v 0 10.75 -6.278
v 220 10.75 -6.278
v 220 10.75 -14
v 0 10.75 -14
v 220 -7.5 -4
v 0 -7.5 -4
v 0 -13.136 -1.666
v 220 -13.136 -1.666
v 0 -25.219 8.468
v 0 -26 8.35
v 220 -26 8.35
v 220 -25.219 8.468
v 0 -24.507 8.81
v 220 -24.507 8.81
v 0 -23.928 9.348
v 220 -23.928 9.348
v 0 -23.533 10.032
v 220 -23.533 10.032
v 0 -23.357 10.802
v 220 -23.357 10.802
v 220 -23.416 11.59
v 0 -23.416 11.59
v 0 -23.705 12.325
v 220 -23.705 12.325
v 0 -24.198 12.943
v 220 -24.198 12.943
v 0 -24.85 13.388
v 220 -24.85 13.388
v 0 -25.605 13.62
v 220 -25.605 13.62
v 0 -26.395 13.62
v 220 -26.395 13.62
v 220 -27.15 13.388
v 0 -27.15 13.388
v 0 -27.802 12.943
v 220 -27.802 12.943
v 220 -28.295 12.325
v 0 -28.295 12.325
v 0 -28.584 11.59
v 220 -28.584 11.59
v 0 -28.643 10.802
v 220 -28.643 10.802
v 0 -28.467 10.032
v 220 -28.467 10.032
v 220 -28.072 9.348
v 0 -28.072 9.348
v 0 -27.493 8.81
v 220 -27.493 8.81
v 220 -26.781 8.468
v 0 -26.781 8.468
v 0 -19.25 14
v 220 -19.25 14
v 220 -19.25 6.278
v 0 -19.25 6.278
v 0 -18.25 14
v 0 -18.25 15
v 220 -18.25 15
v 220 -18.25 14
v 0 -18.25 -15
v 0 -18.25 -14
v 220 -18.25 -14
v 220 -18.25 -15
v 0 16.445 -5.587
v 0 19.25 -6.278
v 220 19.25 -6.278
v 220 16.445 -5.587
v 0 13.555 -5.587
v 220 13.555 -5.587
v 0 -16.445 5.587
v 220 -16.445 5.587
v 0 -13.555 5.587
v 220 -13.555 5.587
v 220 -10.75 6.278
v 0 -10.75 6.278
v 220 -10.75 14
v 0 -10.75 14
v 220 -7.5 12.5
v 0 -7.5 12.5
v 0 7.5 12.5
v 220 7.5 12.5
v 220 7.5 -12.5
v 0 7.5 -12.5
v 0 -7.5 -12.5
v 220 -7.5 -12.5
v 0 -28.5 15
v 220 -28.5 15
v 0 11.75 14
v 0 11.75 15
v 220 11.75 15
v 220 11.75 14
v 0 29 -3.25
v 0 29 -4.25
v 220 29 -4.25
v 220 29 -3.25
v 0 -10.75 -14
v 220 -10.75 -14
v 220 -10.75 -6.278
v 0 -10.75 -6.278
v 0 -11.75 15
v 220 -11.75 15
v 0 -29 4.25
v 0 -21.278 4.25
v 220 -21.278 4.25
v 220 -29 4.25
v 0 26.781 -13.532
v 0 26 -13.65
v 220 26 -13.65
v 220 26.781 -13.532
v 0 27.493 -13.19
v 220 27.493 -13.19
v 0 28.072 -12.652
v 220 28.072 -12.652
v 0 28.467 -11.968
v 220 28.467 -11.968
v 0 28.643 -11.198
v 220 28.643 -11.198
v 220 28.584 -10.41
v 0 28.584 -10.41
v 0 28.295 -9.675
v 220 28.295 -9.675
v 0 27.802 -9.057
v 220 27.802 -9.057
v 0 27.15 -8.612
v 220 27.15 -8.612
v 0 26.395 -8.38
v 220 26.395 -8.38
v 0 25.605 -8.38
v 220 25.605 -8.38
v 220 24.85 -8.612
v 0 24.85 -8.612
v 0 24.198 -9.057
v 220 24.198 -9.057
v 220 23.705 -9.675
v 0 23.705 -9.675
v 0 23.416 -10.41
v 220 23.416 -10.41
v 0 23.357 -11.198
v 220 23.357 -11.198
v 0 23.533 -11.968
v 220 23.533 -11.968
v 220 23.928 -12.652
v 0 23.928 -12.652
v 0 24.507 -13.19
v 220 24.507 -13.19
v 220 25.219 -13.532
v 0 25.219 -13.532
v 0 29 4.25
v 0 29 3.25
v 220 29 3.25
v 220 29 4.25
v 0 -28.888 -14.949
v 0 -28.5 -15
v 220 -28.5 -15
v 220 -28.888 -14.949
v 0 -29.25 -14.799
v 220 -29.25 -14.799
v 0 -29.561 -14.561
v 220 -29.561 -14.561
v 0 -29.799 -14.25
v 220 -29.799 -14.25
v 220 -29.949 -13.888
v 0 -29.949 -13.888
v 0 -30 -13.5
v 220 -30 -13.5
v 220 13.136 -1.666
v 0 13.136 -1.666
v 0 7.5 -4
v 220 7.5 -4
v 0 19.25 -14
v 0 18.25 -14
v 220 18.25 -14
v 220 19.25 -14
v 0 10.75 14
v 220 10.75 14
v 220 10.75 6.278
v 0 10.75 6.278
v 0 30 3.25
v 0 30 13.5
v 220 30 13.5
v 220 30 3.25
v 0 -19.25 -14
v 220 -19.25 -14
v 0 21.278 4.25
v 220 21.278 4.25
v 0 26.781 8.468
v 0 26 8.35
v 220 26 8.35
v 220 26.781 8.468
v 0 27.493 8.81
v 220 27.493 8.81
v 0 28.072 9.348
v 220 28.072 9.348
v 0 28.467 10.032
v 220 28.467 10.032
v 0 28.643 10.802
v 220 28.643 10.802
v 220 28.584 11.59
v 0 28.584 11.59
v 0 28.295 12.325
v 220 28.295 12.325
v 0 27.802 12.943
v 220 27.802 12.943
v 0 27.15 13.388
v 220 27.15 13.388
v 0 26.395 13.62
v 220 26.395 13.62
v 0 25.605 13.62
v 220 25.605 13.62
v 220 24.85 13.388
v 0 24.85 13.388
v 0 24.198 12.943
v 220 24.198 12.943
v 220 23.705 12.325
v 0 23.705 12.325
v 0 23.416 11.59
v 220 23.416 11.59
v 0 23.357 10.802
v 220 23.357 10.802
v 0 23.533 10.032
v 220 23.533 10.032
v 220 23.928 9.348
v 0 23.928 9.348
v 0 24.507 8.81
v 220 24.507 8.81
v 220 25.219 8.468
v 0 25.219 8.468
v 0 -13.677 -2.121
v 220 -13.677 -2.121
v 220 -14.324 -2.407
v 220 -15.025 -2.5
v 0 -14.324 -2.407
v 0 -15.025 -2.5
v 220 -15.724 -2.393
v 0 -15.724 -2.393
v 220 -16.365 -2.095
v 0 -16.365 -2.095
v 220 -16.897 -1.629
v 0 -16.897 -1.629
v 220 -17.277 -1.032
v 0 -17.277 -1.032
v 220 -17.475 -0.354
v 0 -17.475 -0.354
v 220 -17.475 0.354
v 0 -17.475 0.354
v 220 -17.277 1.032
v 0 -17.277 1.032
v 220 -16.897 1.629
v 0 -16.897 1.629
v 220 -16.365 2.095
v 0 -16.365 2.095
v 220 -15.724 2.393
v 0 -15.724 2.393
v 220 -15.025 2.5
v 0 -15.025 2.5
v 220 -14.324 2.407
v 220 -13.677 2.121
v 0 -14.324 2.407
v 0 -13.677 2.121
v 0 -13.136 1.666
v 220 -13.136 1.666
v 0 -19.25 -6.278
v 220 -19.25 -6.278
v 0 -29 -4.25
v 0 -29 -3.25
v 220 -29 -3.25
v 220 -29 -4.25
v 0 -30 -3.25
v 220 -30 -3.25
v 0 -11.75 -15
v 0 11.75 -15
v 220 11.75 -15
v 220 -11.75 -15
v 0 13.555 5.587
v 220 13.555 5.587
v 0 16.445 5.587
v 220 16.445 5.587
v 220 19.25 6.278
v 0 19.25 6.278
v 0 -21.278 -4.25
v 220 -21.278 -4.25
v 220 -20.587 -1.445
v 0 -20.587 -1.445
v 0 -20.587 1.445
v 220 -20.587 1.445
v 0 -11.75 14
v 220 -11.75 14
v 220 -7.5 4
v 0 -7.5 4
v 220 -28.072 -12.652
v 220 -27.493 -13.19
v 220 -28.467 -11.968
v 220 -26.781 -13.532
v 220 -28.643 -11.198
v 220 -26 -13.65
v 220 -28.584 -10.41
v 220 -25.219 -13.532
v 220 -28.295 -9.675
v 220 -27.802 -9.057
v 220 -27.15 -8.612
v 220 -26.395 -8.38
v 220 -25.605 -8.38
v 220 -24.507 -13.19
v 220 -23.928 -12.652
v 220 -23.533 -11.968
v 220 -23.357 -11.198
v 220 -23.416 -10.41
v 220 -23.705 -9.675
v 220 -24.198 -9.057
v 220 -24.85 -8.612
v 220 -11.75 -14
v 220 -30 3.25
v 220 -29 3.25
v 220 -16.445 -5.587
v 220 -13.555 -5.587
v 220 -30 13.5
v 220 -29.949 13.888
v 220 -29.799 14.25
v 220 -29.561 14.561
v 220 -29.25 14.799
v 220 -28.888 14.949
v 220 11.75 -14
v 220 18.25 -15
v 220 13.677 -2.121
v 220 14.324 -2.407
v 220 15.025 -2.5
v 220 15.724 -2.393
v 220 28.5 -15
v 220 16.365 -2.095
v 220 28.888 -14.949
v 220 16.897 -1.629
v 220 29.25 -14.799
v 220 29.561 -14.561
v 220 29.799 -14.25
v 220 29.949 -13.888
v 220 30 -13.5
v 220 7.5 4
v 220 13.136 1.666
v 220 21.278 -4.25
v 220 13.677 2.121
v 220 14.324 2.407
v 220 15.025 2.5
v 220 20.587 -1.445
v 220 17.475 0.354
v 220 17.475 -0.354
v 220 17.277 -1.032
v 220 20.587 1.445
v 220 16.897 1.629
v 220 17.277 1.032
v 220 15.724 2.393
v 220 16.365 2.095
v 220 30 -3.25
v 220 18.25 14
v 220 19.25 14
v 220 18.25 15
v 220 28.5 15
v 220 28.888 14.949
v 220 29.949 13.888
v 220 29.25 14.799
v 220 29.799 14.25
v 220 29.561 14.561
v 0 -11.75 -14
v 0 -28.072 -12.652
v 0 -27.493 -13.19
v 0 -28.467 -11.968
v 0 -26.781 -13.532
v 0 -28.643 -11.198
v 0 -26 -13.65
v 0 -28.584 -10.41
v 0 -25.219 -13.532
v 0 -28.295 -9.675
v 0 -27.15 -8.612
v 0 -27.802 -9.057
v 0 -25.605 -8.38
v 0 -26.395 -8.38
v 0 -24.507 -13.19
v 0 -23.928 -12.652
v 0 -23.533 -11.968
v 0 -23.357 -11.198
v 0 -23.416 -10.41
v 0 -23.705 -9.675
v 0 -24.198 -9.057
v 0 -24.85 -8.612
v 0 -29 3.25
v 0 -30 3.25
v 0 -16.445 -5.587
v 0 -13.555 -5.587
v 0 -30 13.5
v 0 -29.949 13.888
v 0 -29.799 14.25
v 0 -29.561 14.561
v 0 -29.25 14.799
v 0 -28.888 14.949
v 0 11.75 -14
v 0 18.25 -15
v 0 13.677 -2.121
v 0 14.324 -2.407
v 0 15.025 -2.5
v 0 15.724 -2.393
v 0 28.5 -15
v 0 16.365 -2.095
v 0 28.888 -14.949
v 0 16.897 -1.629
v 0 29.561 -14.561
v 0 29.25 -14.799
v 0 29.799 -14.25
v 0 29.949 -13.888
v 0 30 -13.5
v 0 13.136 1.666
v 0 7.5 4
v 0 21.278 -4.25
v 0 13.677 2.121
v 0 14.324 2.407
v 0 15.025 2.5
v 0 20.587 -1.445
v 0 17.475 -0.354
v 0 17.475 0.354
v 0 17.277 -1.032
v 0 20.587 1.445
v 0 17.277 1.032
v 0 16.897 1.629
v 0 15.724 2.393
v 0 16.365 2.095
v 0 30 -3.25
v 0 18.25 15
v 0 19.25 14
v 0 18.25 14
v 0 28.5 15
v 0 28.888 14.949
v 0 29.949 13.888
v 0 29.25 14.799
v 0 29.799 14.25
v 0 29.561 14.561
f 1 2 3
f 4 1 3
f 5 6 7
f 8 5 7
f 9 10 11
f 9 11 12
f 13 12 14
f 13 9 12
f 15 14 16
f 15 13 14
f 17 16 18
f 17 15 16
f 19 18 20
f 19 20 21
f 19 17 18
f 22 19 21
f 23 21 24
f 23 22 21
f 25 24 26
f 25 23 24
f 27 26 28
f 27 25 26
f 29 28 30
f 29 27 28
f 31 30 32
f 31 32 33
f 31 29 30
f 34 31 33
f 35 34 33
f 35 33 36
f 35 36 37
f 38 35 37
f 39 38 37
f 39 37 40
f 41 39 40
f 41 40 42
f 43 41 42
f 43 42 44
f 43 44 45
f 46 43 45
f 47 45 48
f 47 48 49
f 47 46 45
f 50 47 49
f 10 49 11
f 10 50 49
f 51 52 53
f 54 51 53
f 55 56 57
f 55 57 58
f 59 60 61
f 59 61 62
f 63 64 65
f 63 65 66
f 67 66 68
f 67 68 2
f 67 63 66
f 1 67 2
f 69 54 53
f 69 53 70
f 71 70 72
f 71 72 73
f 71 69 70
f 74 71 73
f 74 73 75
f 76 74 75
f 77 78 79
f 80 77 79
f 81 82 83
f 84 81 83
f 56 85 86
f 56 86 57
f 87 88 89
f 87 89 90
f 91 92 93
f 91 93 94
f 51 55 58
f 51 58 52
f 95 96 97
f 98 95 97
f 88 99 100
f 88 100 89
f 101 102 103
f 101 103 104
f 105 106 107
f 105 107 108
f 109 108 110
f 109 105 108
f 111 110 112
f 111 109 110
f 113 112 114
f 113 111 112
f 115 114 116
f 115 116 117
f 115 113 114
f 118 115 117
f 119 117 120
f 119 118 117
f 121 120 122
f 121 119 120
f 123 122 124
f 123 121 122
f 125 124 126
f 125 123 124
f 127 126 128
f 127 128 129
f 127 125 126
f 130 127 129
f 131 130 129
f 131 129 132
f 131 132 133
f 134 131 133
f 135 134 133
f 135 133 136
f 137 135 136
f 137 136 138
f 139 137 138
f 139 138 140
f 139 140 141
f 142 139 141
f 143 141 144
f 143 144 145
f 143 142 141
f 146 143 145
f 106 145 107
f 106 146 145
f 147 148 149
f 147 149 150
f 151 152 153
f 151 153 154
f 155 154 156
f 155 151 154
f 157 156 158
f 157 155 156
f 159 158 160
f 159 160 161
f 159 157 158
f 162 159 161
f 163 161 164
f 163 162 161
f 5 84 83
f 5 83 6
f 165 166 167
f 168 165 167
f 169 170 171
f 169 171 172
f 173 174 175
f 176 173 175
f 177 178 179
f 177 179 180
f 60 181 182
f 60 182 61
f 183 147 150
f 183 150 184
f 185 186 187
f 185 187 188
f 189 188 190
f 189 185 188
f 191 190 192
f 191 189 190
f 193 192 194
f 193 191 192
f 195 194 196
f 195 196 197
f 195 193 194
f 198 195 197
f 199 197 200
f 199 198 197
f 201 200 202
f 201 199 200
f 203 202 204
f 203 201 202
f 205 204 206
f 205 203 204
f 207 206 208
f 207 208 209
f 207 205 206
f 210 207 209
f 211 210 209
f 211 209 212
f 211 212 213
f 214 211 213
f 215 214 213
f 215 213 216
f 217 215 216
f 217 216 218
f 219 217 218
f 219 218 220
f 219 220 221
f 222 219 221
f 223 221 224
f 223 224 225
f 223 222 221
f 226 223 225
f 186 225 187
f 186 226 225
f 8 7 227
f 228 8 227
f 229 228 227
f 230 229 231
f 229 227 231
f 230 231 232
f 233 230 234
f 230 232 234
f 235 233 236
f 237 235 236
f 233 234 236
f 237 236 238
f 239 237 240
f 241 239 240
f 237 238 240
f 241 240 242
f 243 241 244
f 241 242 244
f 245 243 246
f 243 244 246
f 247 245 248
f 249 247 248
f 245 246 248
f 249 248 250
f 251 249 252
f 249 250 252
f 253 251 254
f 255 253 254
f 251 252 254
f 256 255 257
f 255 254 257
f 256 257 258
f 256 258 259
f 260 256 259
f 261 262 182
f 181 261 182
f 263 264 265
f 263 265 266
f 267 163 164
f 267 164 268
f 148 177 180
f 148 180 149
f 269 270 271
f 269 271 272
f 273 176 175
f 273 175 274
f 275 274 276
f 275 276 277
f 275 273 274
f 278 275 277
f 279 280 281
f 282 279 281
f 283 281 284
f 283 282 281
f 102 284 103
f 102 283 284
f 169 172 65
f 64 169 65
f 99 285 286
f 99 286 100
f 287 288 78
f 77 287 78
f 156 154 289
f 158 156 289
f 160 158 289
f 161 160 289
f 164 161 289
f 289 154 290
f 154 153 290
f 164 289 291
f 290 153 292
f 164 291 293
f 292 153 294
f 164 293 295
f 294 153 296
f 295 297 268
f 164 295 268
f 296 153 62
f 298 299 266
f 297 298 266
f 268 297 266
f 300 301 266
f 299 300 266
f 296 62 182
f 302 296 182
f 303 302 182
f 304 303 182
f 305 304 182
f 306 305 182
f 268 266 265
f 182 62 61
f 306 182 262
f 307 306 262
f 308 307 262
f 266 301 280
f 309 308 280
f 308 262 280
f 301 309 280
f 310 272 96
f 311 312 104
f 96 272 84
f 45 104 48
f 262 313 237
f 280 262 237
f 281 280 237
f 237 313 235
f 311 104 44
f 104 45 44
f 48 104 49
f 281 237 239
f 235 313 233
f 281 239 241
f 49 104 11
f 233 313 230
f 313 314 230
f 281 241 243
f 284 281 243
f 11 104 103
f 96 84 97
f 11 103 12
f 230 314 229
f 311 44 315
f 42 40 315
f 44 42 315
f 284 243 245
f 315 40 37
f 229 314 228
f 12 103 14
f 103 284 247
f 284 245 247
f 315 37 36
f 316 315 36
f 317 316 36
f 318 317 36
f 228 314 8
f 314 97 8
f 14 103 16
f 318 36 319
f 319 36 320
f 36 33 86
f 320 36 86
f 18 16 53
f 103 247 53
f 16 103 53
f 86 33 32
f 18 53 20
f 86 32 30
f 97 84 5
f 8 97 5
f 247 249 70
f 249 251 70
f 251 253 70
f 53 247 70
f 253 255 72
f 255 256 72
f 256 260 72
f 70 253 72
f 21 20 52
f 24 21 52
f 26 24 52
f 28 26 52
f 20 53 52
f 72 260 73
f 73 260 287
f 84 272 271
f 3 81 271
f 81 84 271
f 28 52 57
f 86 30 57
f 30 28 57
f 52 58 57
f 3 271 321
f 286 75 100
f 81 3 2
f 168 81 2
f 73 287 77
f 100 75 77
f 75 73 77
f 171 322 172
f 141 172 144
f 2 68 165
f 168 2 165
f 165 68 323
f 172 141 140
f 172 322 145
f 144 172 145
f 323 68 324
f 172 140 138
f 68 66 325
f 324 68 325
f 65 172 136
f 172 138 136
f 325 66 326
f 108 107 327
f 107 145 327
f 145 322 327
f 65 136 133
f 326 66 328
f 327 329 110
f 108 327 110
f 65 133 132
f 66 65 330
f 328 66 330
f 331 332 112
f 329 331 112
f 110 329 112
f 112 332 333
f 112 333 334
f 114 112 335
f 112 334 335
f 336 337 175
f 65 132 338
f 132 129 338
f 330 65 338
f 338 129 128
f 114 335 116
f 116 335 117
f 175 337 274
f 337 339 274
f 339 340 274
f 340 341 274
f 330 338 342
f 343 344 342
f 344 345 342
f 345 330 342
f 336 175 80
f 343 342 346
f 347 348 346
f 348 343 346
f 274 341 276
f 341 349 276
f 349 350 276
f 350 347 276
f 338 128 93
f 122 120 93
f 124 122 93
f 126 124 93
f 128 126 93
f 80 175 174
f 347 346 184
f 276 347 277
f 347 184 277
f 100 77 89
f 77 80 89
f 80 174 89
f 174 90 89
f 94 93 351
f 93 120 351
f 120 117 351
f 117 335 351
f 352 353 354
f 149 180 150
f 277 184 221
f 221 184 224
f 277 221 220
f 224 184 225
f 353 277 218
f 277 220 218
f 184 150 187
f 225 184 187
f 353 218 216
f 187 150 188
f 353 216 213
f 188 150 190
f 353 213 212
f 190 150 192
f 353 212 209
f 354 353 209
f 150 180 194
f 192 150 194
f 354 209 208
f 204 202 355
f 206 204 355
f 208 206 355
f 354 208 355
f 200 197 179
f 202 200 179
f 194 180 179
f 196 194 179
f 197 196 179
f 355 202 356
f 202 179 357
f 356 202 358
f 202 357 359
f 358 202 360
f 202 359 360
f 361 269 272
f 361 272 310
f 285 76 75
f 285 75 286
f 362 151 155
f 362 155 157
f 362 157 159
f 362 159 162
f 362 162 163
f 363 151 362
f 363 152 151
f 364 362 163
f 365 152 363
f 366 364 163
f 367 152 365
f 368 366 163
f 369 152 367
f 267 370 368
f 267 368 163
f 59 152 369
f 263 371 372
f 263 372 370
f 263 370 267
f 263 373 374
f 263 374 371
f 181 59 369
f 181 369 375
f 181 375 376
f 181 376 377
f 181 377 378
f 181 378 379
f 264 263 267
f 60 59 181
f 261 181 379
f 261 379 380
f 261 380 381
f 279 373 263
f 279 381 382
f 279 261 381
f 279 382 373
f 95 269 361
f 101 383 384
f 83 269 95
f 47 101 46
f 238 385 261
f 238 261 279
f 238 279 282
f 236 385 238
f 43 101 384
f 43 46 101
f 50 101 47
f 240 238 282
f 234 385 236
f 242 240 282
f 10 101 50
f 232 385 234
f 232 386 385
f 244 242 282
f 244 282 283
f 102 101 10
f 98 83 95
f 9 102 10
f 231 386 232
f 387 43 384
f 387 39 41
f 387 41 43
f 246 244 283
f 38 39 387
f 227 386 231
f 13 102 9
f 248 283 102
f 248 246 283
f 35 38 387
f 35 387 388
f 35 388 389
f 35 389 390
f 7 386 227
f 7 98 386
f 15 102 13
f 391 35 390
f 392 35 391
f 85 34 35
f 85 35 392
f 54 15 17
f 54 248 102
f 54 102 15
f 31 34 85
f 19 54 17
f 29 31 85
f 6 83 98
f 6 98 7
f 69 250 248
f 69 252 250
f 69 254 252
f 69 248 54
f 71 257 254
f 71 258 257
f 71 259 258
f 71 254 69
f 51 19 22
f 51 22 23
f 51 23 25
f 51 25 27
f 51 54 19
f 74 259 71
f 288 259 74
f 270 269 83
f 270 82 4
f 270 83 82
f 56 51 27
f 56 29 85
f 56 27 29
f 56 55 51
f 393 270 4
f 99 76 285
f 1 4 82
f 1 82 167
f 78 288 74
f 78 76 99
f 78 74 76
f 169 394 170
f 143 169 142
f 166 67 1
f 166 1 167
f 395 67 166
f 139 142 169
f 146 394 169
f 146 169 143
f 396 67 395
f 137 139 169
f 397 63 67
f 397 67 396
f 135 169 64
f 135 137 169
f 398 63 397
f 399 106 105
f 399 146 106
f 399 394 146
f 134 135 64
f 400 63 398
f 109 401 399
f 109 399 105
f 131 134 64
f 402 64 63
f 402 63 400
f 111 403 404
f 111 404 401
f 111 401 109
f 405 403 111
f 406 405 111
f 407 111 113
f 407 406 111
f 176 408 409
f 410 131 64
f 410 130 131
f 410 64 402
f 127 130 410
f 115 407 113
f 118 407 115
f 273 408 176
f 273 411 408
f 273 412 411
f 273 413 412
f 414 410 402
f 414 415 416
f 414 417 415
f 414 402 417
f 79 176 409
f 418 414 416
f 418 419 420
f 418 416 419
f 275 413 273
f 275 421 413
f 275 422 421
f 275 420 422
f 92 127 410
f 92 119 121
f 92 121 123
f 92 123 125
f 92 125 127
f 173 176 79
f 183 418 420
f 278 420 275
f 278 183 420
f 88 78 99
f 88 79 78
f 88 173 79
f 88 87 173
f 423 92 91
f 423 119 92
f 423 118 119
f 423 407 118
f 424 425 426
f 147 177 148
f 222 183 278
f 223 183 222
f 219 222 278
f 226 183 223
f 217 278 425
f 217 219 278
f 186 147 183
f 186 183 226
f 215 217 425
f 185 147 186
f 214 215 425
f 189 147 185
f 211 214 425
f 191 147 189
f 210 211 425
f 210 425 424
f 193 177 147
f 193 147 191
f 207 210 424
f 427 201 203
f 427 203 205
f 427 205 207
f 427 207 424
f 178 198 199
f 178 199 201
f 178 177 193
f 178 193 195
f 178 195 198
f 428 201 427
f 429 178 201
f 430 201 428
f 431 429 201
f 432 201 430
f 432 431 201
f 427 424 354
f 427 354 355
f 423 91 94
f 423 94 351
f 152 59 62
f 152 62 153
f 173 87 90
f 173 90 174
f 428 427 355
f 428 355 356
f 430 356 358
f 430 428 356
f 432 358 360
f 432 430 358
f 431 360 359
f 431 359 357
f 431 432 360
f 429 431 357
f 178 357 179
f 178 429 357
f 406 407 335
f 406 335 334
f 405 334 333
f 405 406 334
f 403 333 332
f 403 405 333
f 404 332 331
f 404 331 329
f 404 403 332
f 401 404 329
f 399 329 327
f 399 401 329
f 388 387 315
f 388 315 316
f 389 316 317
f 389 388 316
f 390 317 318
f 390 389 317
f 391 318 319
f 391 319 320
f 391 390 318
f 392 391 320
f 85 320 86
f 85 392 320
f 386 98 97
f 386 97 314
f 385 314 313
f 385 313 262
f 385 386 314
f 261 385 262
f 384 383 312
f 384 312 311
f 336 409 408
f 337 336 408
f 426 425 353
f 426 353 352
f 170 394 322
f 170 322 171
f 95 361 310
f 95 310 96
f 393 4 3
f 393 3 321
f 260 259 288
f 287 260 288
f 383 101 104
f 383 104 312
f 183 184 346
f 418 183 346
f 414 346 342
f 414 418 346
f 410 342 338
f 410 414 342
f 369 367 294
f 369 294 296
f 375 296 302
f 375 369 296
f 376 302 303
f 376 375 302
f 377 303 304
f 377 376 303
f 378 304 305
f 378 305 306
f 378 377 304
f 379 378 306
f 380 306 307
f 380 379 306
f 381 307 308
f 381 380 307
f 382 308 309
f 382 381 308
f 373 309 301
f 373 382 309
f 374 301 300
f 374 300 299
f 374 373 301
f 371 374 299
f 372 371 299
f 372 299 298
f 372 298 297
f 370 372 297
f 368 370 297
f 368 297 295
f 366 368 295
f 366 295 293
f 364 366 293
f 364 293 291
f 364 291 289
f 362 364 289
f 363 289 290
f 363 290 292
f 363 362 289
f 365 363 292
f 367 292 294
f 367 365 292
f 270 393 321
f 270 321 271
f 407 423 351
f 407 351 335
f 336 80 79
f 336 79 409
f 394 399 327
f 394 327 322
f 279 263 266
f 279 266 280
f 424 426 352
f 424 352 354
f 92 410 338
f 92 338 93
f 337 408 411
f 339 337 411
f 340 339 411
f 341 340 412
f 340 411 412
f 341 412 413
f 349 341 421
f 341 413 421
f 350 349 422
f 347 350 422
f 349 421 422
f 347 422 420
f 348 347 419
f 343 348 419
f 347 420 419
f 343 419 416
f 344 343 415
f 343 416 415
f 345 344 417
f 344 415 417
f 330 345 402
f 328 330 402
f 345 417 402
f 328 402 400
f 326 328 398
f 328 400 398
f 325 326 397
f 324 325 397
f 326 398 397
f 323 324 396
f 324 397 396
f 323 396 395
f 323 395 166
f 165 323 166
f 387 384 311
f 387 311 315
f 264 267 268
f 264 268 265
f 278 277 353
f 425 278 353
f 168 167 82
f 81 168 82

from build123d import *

# Parameters (mm, degrees)
SKETCH1_R                 = 2.65
F_30_X_60G_X_R1_5_1_DEPTH = 220


with BuildPart() as part:
    # Sketch1 → 铝型材 30 X 60G X R1.5(1) (new body)
    with BuildSketch(Plane(origin=(0, 0, 0), x_dir=(0, 0, -1), z_dir=(1, 0, 0))):
        with BuildLine():
            Line((-3.25, 30), (-3.25, 29))
            Line((-3.25, 29), (-4.25, 29))
            Line((-4.25, 29), (-4.25, 21.277812156))
            ThreePointArc((-4.25, 21.277812156), (0, 20.5), (4.25, 21.277812156))
            Line((4.25, 21.277812156), (4.25, 29))
            Line((4.25, 29), (3.25, 29))
            Line((3.25, 29), (3.25, 30))
            Line((3.25, 30), (13.5, 30))
            ThreePointArc((13.5, 30), (14.560660172, 29.560660172), (15, 28.5))
            Line((15, 28.5), (15, 18.25))
            Line((15, 18.25), (14, 18.25))
            Line((14, 18.25), (14, 19.25))
            Line((14, 19.25), (6.277812156, 19.25))
            ThreePointArc((6.277812156, 19.25), (5.5, 15), (6.277812156, 10.75))
            Line((6.277812156, 10.75), (14, 10.75))
            Line((14, 10.75), (14, 11.75))
            Line((14, 11.75), (15, 11.75))
            Line((15, 11.75), (15, -11.75))
            Line((15, -11.75), (14, -11.75))
            Line((14, -11.75), (14, -10.75))
            Line((14, -10.75), (6.277812156, -10.75))
            ThreePointArc((6.277812156, -10.75), (5.5, -15), (6.277812156, -19.25))
            Line((6.277812156, -19.25), (14, -19.25))
            Line((14, -19.25), (14, -18.25))
            Line((14, -18.25), (15, -18.25))
            Line((15, -18.25), (15, -28.5))
            ThreePointArc((15, -28.5), (14.560660172, -29.560660172), (13.5, -30))
            Line((13.5, -30), (3.25, -30))
            Line((3.25, -30), (3.25, -29))
            Line((3.25, -29), (4.25, -29))
            Line((4.25, -29), (4.25, -21.277812156))
            ThreePointArc((4.25, -21.277812156), (0, -20.5), (-4.25, -21.277812156))
            Line((-4.25, -21.277812156), (-4.25, -29))
            Line((-4.25, -29), (-3.25, -29))
            Line((-3.25, -29), (-3.25, -30))
            Line((-3.25, -30), (-13.5, -30))
            ThreePointArc((-13.5, -30), (-14.560660172, -29.560660172), (-15, -28.5))
            Line((-15, -28.5), (-15, -18.25))
            Line((-15, -18.25), (-14, -18.25))
            Line((-14, -18.25), (-14, -19.25))
            Line((-14, -19.25), (-6.277812156, -19.25))
            ThreePointArc((-6.277812156, -19.25), (-5.5, -15), (-6.277812156, -10.75))
            Line((-6.277812156, -10.75), (-14, -10.75))
            Line((-14, -10.75), (-14, -11.75))
            Line((-14, -11.75), (-15, -11.75))
            Line((-15, -11.75), (-15, 11.75))
            Line((-15, 11.75), (-14, 11.75))
            Line((-14, 11.75), (-14, 10.75))
            Line((-14, 10.75), (-6.277812156, 10.75))
            ThreePointArc((-6.277812156, 10.75), (-5.5, 15), (-6.277812156, 19.25))
            Line((-6.277812156, 19.25), (-14, 19.25))
            Line((-14, 19.25), (-14, 18.25))
            Line((-14, 18.25), (-15, 18.25))
            Line((-15, 18.25), (-15, 28.5))
            ThreePointArc((-15, 28.5), (-14.560660172, 29.560660172), (-13.5, 30))
            Line((-13.5, 30), (-3.25, 30))
        make_face()
        with Locations((-11, 26)):
            Circle(SKETCH1_R, mode=Mode.SUBTRACT)
        with Locations((11, 26)):
            Circle(SKETCH1_R, mode=Mode.SUBTRACT)
        with Locations((11, -26)):
            Circle(SKETCH1_R, mode=Mode.SUBTRACT)
        with Locations((-11, -26)):
            Circle(SKETCH1_R, mode=Mode.SUBTRACT)
        with BuildLine():
            Line((-12.5, 7.5), (-4, 7.5))
            Line((-4, 7.5), (-1.665625283, 13.135679101))
            ThreePointArc((-1.665625283, 13.135679101), (0, 17.5), (1.665625283, 13.135679101))
            Line((1.665625283, 13.135679101), (4, 7.5))
            Line((4, 7.5), (12.5, 7.5))
            Line((12.5, 7.5), (12.5, -7.5))
            Line((12.5, -7.5), (4, -7.5))
            Line((4, -7.5), (1.665625283, -13.135679101))
            ThreePointArc((1.665625283, -13.135679101), (0, -17.5), (-1.665625283, -13.135679101))
            Line((-1.665625283, -13.135679101), (-4, -7.5))
            Line((-4, -7.5), (-12.5, -7.5))
            Line((-12.5, -7.5), (-12.5, 7.5))
        make_face(mode=Mode.SUBTRACT)
    extrude(amount=F_30_X_60G_X_R1_5_1_DEPTH)


solid = part.part
